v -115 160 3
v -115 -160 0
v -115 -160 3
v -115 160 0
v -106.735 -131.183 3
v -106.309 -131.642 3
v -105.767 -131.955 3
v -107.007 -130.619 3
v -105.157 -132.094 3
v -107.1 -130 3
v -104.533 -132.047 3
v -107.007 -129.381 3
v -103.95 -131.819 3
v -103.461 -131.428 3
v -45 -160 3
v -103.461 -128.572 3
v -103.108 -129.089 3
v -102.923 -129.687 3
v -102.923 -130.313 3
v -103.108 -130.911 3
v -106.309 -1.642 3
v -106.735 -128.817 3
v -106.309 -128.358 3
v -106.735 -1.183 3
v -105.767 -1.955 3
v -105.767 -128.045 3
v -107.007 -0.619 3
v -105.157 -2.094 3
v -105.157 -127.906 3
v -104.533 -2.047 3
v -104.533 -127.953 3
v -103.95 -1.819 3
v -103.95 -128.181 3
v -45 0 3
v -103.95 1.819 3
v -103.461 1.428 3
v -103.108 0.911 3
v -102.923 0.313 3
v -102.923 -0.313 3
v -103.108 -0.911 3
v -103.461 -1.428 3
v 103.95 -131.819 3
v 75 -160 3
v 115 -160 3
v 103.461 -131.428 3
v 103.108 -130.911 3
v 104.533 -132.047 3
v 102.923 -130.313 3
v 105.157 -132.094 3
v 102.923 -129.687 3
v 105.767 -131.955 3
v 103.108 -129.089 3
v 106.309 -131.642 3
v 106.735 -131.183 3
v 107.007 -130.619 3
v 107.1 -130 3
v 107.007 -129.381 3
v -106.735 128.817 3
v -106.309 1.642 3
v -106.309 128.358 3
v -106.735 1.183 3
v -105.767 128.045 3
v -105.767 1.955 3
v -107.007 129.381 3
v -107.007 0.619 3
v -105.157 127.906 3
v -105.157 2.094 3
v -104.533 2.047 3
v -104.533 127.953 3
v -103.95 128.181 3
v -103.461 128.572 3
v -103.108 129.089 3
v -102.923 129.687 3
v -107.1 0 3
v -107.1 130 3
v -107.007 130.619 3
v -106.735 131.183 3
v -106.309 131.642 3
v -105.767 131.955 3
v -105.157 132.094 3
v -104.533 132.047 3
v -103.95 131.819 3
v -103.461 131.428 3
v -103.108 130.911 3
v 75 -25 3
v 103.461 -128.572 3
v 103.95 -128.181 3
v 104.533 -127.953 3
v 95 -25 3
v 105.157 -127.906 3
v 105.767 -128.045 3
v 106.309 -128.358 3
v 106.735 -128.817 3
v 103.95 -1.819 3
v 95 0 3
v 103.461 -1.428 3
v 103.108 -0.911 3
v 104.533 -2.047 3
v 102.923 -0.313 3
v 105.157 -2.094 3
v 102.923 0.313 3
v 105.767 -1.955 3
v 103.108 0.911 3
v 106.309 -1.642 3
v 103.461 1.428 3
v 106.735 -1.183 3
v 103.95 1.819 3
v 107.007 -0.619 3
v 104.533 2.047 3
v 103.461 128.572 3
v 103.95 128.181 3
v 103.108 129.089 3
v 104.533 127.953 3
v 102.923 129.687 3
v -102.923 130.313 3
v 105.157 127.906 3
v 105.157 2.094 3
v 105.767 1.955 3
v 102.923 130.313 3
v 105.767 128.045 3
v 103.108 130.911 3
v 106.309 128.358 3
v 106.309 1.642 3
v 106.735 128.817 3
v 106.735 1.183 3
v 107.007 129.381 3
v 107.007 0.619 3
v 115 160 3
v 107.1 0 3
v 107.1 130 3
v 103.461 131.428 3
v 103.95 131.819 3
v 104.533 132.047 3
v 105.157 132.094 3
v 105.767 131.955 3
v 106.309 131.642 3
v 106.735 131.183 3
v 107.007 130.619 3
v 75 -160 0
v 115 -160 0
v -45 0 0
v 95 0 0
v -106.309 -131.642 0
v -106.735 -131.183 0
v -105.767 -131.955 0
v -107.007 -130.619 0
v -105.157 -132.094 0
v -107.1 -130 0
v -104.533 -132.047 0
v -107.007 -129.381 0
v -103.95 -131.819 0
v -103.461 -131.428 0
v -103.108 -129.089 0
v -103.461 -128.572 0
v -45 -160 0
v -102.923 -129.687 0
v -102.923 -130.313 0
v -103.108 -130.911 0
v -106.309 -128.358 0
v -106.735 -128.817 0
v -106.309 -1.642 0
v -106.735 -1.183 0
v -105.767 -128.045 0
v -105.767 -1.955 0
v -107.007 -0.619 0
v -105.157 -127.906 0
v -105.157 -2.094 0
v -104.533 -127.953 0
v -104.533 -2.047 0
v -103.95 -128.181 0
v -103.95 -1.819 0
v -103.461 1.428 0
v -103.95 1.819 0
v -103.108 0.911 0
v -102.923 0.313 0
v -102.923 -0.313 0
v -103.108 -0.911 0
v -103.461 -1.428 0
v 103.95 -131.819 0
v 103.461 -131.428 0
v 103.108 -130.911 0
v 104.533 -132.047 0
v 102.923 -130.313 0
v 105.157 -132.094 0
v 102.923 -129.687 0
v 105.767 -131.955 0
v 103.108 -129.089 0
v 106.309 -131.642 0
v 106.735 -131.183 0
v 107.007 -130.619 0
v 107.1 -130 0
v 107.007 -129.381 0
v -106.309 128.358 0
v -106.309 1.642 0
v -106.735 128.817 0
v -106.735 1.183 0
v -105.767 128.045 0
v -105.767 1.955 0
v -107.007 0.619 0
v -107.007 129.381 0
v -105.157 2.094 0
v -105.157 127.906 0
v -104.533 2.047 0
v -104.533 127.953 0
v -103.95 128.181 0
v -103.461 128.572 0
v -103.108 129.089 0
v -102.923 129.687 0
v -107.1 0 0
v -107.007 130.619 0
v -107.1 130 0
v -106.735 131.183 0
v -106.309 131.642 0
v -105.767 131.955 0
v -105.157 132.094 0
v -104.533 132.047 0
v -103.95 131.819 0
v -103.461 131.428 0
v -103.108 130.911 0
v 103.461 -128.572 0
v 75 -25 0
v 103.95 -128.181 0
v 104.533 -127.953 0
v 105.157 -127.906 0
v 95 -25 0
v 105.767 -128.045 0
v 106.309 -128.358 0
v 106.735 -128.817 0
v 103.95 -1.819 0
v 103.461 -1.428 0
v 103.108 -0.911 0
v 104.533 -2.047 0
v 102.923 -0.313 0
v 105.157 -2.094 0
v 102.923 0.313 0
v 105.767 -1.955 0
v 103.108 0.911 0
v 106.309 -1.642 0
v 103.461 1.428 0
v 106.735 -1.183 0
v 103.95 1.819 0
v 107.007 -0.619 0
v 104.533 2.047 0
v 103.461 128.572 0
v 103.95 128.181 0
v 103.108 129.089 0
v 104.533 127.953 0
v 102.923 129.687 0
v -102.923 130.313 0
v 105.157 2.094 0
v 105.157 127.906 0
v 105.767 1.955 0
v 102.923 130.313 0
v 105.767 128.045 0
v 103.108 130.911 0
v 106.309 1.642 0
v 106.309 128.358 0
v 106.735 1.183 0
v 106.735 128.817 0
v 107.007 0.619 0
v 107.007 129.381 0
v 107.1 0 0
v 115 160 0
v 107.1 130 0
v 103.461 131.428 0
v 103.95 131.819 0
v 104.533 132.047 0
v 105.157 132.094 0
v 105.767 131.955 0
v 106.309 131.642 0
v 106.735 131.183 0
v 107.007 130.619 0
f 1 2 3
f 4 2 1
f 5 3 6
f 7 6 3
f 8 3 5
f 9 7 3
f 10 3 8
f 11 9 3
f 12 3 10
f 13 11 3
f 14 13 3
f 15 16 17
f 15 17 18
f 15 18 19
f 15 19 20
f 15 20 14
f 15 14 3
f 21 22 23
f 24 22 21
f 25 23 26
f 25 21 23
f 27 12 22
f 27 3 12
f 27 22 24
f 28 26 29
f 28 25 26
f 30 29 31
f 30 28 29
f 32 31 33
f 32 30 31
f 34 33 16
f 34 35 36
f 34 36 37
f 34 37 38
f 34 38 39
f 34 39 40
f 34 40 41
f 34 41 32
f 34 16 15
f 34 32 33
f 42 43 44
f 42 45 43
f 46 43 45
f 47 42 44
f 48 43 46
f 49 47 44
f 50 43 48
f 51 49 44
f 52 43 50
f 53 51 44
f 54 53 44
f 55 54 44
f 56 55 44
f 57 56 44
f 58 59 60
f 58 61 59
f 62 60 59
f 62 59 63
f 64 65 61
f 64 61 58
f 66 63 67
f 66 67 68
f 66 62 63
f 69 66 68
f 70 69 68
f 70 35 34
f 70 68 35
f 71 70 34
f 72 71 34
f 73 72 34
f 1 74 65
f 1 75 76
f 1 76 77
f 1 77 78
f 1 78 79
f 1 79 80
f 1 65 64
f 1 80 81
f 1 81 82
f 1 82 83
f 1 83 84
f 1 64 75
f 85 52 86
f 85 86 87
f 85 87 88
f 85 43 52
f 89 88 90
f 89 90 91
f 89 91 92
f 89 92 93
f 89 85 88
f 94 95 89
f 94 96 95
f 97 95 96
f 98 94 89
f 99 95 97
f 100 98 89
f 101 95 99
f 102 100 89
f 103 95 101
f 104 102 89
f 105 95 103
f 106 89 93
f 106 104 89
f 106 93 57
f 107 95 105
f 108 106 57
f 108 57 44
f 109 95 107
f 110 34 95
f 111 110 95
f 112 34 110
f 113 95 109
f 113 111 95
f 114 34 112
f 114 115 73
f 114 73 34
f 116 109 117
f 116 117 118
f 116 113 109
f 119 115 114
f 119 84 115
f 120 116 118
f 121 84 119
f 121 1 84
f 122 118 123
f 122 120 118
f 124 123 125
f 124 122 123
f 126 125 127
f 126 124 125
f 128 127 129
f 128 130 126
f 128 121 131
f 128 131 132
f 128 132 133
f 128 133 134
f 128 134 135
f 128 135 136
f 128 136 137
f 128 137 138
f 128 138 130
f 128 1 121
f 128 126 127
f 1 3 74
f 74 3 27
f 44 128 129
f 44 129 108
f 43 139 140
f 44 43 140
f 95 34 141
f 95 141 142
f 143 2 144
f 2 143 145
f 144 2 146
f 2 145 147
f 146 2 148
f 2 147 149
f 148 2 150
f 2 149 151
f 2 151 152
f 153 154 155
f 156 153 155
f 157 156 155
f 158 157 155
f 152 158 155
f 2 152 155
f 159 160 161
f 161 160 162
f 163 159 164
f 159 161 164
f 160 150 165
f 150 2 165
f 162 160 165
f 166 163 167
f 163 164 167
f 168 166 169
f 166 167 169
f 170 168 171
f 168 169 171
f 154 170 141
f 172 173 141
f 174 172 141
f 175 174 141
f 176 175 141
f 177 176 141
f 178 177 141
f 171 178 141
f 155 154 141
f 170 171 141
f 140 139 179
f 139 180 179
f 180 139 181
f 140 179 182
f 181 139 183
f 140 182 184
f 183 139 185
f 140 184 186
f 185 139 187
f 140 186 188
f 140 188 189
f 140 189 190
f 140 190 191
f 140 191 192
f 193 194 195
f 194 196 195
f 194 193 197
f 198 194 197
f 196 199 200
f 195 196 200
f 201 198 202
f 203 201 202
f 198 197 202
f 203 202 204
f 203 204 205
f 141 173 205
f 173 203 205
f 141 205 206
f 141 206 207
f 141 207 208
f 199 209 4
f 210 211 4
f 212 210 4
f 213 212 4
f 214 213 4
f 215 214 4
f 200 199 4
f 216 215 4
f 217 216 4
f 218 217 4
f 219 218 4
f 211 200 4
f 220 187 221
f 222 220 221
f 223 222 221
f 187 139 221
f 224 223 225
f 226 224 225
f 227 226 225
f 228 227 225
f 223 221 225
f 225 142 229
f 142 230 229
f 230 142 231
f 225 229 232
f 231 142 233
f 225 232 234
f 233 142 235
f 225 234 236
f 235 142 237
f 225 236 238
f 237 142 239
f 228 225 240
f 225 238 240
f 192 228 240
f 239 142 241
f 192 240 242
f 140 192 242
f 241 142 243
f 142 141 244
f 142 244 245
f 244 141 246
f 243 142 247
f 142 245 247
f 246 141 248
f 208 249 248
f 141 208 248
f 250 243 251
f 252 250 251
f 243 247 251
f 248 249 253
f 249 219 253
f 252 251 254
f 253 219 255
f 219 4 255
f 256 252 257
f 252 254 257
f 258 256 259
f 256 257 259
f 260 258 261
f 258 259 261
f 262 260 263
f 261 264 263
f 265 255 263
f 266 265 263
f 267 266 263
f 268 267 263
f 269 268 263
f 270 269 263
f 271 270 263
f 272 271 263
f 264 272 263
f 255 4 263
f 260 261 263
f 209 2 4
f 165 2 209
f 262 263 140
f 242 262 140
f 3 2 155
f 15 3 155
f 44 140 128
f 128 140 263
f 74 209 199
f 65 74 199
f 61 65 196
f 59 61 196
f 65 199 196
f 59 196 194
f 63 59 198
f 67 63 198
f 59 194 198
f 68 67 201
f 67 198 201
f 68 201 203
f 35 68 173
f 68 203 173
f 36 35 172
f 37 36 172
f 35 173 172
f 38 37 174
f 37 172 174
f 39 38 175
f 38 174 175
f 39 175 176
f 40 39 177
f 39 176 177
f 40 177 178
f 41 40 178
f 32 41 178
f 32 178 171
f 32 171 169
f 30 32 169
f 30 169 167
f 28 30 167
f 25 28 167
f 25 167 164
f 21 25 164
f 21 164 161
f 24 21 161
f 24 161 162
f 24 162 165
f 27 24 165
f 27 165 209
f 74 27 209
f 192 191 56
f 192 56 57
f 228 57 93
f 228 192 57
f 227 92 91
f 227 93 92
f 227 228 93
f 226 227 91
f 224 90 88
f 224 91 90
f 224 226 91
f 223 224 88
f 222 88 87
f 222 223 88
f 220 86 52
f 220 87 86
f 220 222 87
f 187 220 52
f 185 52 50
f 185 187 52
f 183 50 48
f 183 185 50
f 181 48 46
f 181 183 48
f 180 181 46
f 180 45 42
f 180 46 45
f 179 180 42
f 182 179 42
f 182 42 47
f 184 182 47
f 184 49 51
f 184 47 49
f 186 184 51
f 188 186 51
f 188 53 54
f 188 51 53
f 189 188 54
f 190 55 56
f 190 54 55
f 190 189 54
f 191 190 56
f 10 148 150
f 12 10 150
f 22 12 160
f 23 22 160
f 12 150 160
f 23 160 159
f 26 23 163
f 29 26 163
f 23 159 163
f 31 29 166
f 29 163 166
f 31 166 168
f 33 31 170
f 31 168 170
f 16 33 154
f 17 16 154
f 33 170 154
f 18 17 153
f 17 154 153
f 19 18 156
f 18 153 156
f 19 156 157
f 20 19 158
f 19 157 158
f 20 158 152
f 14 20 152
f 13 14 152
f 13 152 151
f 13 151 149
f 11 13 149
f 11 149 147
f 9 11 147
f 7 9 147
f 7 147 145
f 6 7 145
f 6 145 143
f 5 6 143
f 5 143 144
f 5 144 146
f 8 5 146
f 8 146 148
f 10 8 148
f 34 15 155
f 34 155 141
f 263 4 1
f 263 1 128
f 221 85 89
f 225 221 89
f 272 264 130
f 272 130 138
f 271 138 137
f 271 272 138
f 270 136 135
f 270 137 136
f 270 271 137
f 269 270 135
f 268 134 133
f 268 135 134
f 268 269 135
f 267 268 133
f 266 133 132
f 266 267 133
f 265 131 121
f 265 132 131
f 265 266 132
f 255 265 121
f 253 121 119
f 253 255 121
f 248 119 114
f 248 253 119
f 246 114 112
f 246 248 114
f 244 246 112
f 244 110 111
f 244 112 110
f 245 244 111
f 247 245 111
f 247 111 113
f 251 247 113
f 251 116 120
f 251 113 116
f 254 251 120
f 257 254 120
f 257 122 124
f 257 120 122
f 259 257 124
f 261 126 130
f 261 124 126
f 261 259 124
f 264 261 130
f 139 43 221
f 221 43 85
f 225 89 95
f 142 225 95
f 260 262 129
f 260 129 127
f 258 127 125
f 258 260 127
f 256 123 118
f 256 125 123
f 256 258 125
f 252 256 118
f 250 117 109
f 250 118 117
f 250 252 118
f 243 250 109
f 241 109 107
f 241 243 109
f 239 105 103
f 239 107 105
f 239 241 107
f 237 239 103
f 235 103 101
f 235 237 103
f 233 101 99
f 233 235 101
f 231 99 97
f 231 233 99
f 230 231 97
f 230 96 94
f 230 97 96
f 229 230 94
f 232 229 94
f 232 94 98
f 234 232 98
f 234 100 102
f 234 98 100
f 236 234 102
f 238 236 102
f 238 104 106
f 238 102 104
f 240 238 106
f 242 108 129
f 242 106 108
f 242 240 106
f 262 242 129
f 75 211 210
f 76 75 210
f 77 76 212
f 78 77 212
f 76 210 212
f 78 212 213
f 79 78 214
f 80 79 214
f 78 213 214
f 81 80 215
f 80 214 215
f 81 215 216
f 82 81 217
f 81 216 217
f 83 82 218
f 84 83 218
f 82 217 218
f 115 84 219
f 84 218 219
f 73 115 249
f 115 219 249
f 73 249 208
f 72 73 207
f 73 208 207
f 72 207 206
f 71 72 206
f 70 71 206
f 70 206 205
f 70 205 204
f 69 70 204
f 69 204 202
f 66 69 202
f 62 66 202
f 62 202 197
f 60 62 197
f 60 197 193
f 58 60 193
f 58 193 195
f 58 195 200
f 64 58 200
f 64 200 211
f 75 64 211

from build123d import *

# Parameters (mm, degrees)
F1_W     = 230
F1_H     = 320
F2_DEPTH = 3
F4_D     = 4.2
F4_DEPTH = 4
F4_TIP   = 1.2618073
F5_W     = 120
F5_H     = 160
F6_DEPTH = 25
F7_W     = 20
F7_H     = 25
F8_DEPTH = 3


# Not quite as in the source:
# - a pattern or mirror of a feature is missing from the dataset's text; its kind, count and spacing are read off the source's solid


with BuildPart() as f2:
    # F1 (on Top) → F2 (new body)
    with BuildSketch(Plane.XY):
        Rectangle(F1_W, F1_H)
    extrude(amount=F2_DEPTH)

    # F4
    with Locations(Plane.XY.offset(3)):
        with Locations((-105, 130), (-105, 0), (-105, -130)):
            f4 = Hole(F4_D / 2, depth=F4_DEPTH)
            with Locations((0, 0, -(F4_DEPTH + F4_TIP / 2))):  # 118° drill point
                Cone(0, F4_D / 2, F4_TIP, mode=Mode.SUBTRACT)

    # F4_copies: F4 across plane
    add(f4.mirror(Plane(origin=(0, 0, 0), x_dir=(0, 0, 1), z_dir=(1, 0, 0))), mode=Mode.SUBTRACT)

    # F5 (on face) → F6 (cut)
    with BuildSketch(Plane.XY.offset(3)):
        with Locations((15, -80)):
            Rectangle(F5_W, F5_H)
    extrude(amount=-F6_DEPTH, mode=Mode.SUBTRACT)

    # F7 (on face) → F8 (cut, through all)
    with BuildSketch(Plane.XY.offset(3)):
        with Locations((85, -12.5)):
            Rectangle(F7_W, F7_H)
    extrude(amount=-F8_DEPTH, mode=Mode.SUBTRACT)


solid = f2.part
